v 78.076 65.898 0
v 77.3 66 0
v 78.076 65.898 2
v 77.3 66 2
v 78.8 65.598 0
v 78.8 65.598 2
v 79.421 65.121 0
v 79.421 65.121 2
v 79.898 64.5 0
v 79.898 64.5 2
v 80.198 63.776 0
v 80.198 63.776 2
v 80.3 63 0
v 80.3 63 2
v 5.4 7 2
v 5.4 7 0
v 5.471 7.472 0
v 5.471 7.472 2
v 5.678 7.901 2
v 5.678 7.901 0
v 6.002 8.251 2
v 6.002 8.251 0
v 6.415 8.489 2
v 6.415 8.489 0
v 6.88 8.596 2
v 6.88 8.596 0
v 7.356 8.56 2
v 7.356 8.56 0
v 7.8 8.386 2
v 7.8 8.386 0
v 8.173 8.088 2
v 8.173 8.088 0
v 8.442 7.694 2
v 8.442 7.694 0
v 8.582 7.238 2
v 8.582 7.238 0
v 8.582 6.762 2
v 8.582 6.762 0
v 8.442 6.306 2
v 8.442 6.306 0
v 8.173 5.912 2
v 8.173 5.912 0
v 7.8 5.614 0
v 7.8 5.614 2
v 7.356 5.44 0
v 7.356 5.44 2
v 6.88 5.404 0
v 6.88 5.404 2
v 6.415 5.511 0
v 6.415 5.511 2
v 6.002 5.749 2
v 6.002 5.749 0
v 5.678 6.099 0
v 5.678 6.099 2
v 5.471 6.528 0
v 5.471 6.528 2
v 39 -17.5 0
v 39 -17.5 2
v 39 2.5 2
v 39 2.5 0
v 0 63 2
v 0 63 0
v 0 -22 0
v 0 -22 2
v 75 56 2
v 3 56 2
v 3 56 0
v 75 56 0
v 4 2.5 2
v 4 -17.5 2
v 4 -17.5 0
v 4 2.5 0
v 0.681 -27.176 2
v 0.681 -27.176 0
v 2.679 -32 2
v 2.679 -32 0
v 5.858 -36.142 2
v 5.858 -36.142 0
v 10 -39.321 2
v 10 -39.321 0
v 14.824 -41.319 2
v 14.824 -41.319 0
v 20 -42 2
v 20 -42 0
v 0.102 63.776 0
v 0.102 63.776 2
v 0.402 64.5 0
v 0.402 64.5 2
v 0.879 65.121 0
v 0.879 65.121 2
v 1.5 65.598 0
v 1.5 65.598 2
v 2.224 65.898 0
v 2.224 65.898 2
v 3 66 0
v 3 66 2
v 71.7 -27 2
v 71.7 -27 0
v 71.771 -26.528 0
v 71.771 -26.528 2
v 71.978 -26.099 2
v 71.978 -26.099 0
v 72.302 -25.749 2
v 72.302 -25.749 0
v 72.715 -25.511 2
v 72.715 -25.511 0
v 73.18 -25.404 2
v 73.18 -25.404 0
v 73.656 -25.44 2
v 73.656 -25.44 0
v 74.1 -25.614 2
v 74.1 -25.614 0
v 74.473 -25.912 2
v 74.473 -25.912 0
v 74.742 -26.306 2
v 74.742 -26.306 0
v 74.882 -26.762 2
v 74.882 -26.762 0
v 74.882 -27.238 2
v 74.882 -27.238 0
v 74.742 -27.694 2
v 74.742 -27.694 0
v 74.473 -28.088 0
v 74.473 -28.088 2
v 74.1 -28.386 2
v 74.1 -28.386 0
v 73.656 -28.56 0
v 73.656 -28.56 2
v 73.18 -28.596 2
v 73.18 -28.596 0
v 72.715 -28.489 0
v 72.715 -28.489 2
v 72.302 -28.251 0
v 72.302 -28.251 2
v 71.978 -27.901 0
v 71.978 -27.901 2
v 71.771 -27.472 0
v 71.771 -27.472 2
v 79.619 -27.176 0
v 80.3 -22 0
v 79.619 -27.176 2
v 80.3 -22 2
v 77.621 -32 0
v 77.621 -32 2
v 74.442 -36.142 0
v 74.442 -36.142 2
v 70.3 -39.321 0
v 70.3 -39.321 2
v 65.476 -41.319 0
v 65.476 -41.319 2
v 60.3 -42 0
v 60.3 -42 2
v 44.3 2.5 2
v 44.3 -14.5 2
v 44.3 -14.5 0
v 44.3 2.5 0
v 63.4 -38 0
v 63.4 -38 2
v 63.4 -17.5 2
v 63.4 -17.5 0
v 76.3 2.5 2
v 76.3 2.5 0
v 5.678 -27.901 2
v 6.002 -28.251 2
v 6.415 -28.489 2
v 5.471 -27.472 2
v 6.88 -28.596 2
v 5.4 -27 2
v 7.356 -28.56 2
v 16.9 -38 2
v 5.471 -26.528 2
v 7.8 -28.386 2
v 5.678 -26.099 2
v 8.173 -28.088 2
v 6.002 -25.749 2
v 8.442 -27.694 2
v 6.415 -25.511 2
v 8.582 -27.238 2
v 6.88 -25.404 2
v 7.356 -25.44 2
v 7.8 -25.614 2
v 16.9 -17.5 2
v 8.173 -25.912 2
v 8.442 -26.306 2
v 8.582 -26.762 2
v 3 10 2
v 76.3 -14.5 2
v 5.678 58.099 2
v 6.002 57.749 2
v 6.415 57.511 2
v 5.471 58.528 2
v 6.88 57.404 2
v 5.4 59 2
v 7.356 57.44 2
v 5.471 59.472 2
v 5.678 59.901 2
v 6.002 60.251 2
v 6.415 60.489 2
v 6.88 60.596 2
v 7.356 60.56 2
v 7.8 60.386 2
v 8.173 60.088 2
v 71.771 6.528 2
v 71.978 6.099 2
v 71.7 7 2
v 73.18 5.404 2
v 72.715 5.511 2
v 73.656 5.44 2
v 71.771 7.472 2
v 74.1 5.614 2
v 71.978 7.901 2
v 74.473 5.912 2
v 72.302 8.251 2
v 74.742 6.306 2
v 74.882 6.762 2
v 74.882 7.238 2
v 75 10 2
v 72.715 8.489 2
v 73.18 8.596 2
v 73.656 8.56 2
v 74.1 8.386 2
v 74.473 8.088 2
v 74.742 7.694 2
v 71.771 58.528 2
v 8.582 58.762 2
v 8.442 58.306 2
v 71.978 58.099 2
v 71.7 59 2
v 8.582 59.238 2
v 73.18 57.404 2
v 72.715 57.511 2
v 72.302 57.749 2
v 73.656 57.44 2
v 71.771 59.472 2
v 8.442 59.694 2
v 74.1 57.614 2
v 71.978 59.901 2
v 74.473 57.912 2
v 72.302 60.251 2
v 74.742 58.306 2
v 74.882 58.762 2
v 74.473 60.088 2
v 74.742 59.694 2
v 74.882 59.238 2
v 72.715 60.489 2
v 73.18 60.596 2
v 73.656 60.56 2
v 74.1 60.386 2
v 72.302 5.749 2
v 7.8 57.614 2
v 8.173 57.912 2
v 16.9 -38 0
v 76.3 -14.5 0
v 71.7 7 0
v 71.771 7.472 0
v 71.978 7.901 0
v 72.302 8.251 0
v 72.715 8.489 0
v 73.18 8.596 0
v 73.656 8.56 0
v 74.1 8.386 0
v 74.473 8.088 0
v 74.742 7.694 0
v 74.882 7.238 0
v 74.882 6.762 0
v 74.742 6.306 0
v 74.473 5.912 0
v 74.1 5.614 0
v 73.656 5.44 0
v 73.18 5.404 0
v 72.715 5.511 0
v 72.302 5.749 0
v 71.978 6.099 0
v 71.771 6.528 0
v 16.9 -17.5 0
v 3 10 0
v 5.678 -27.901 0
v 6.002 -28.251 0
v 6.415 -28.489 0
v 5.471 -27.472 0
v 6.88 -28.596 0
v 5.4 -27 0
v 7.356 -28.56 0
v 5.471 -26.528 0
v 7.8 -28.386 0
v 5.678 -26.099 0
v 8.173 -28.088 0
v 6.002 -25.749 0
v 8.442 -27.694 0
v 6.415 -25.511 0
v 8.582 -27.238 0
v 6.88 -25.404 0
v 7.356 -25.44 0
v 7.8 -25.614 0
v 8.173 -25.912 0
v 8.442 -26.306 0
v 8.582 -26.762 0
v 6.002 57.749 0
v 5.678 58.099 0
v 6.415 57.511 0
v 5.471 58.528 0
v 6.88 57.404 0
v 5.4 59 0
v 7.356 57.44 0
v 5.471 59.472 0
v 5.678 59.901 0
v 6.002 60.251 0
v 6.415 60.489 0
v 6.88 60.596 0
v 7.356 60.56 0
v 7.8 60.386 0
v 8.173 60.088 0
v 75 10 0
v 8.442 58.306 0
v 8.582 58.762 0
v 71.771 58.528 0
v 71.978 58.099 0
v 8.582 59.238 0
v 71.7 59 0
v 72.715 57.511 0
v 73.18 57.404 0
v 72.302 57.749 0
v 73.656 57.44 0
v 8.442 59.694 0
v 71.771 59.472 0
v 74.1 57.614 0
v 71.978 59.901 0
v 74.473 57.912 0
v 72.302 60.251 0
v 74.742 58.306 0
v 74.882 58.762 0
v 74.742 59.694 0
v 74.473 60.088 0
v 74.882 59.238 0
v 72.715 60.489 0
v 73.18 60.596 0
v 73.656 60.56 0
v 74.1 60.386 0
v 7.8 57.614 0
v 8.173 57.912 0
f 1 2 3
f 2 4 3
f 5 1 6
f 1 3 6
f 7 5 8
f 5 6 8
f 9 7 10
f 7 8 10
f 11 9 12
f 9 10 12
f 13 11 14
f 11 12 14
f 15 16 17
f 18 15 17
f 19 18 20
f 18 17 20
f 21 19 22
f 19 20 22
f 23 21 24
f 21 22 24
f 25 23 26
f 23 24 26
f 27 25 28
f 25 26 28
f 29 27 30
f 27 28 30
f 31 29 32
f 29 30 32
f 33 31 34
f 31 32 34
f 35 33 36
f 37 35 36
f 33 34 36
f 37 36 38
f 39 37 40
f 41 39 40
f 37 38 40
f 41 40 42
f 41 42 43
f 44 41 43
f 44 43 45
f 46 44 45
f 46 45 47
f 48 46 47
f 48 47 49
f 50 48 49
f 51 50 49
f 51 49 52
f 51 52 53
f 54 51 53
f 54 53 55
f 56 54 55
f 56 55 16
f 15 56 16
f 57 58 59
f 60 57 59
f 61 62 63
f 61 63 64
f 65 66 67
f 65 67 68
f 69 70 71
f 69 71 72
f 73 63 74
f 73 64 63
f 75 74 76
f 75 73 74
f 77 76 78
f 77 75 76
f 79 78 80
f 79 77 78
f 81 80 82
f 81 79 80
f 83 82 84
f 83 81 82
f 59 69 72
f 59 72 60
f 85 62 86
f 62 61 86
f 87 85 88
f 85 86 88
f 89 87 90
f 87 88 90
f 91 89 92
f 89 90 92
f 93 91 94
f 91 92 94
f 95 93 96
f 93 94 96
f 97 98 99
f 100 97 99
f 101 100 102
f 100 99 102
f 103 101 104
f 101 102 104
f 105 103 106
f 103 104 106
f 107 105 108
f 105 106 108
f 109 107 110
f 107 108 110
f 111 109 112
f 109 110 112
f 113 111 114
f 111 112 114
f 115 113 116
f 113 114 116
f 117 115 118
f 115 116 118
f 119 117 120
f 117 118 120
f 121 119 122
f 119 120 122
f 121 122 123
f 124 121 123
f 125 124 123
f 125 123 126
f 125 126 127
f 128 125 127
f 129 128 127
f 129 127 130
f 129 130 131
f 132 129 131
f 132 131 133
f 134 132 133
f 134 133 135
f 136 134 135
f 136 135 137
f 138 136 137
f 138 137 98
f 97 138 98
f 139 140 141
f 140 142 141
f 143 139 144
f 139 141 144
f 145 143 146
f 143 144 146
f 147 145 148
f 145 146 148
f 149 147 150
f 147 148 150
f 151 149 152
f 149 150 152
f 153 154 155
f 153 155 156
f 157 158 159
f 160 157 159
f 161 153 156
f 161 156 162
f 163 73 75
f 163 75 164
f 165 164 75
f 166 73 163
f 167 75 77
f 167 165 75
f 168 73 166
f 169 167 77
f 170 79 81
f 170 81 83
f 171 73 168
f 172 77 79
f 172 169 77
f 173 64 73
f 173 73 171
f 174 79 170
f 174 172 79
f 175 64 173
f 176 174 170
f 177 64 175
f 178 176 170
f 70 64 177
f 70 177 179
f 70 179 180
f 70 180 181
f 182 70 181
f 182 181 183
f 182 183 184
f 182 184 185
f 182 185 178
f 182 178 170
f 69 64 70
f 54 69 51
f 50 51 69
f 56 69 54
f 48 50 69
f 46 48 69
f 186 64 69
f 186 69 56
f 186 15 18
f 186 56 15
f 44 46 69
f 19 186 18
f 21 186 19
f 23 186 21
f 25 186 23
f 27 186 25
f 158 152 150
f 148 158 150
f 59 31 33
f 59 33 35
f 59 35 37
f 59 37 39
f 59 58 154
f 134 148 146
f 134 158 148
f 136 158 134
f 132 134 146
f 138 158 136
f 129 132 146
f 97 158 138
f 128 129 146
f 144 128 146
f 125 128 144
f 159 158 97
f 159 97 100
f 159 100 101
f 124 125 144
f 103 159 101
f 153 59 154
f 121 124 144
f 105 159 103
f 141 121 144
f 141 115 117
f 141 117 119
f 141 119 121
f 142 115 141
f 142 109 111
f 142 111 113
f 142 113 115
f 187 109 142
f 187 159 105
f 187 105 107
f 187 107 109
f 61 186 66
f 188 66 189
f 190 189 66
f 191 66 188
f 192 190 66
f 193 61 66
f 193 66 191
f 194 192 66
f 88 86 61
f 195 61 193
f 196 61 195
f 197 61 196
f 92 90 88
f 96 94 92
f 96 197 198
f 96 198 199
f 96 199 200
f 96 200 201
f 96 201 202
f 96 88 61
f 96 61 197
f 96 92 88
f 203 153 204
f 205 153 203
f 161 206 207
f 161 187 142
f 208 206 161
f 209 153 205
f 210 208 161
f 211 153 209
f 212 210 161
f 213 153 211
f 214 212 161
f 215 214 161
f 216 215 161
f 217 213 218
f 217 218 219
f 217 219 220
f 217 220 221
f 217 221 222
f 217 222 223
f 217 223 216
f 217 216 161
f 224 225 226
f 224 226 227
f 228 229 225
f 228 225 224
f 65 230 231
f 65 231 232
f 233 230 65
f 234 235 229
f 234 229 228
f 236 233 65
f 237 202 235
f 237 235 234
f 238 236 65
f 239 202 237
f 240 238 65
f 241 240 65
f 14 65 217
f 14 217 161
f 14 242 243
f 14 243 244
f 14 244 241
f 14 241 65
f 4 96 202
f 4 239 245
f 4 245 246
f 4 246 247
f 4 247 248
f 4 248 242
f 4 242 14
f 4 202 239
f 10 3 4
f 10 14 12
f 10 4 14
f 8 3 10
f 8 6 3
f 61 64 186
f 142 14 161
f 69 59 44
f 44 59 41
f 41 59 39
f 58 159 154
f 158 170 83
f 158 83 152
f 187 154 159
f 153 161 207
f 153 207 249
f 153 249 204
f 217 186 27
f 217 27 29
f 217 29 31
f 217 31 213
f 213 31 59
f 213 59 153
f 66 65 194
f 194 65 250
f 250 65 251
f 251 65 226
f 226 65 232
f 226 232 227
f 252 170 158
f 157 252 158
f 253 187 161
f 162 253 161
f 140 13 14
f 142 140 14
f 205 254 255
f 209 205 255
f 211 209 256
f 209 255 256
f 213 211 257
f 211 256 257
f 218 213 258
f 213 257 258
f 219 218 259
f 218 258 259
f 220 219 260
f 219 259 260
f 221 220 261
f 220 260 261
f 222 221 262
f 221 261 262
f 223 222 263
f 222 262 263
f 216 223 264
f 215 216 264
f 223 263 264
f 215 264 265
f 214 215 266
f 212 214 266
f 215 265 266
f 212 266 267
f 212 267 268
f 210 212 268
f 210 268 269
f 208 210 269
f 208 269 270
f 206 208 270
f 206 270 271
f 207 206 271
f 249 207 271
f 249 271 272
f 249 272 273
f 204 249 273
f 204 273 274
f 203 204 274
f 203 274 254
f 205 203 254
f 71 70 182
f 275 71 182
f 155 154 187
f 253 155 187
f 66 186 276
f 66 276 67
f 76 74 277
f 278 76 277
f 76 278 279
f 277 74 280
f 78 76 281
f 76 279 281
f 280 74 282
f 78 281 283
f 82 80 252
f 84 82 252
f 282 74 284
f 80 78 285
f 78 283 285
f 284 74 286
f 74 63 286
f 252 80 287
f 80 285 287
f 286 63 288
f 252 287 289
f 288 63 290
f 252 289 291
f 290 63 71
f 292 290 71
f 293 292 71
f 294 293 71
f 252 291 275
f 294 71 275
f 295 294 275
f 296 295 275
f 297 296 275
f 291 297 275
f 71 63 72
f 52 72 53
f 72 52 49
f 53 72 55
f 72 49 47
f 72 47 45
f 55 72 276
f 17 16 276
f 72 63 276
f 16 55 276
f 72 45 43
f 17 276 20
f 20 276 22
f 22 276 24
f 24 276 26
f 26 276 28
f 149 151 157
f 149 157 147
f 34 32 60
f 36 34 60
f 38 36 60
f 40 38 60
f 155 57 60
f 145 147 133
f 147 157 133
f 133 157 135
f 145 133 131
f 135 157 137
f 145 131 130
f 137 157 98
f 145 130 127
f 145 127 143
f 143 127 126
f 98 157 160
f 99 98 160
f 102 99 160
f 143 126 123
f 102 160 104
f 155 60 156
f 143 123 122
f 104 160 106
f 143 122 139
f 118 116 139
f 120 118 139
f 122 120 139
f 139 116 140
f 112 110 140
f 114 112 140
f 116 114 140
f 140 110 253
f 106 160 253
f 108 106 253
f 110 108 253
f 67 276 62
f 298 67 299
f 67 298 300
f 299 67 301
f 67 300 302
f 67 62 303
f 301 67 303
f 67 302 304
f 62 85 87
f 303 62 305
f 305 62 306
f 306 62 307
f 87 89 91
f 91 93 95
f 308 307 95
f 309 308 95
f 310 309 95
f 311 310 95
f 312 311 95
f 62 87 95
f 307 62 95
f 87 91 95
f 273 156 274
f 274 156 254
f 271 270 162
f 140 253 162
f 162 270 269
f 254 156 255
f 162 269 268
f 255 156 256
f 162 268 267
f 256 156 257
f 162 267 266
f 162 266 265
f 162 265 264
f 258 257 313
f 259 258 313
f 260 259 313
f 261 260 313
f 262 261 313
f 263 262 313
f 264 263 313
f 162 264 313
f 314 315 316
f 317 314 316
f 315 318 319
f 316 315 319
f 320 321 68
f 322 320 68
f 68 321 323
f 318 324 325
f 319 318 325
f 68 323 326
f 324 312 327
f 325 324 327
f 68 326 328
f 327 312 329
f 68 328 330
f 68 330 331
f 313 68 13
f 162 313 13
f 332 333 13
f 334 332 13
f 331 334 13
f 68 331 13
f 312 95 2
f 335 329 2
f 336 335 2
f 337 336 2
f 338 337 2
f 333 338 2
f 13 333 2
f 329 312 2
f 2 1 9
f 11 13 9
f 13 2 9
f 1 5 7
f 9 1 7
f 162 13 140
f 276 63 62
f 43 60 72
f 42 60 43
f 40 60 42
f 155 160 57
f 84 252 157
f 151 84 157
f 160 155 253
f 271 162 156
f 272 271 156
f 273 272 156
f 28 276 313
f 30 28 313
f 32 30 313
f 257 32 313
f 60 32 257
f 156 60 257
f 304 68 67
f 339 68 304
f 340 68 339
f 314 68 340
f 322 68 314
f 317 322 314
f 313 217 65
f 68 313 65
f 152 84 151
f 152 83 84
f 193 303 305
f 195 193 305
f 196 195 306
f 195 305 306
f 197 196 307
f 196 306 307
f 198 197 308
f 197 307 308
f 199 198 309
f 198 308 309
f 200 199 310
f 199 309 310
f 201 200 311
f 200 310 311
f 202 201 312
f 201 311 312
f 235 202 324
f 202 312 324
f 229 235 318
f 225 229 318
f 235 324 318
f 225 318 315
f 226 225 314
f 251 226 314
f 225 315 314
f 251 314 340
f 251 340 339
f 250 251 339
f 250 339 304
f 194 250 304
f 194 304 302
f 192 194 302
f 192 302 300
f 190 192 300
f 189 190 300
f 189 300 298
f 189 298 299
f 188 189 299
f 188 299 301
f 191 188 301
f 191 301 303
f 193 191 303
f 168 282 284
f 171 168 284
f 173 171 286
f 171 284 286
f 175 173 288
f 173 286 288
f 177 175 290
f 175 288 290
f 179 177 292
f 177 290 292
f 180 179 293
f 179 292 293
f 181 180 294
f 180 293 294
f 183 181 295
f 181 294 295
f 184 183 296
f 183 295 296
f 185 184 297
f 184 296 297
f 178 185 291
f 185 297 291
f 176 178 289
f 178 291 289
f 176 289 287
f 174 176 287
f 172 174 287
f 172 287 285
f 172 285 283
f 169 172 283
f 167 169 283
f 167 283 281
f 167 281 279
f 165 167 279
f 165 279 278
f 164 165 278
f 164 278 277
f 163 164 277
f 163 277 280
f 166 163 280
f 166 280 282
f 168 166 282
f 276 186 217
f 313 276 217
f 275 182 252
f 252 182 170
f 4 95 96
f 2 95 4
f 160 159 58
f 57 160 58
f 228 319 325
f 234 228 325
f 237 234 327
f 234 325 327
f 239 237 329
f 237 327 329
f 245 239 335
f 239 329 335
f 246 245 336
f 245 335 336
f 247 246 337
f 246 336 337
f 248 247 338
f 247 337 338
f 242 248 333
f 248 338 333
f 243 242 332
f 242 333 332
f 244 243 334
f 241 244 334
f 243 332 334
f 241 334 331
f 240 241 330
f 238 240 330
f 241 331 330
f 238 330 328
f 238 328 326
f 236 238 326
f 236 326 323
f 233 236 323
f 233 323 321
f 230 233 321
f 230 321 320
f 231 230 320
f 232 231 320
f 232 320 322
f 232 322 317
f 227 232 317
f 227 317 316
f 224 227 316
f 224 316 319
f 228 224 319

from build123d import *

# Parameters (mm, degrees)
SKETCH1_W                      = 80.3
SKETCH1_H                      = 66
BOSS_EXTRUDE1_DEPTH            = 2
F_3_2_3_2_DIAMETER_HOLE1_D     = 3.2
FILLET1_R                      = 3
SKETCH4_W                      = 80.3
SKETCH4_H                      = 2
BOSS_EXTRUDE2_DEPTH            = 42
FILLET2_R                      = 20
F_3_2_3_2_DIAMETER_HOLE2_D     = 3.2
F_3_2_3_2_DIAMETER_HOLE2_DEPTH = 60
F_3_2_3_2_DIAMETER_HOLE2_TIP   = 0.96137699
SKETCH7_W                      = 72
SKETCH7_H                      = 46
CUT_EXTRUDE1_DEPTH             = 3
SKETCH10_W                     = 35
SKETCH10_H                     = 20
SKETCH10_W_2                   = 32
SKETCH10_H_2                   = 17
CUT_EXTRUDE3_DEPTH             = 3


with BuildPart() as part:
    # Sketch1 → Boss-Extrude1 (new body)
    with BuildSketch(Plane.XY):
        with Locations((40.15, 33)):
            Rectangle(SKETCH1_W, SKETCH1_H)
    extrude(amount=BOSS_EXTRUDE1_DEPTH)

    # Ø3.2 (3.2) Diameter Hole1 (through all)
    with Locations(Plane.XY.offset(2)):
        with Locations((7, 59), (73.3, 59), (73.3, 7), (7, 7)):
            Hole(F_3_2_3_2_DIAMETER_HOLE1_D / 2)

    # Fillet1
    fillet1_edges = [part.edges().sort_by_distance(p)[0] for p in [
        (0, 66, 1),
        (80.3, 66, 1),
    ]]
    fillet(fillet1_edges, radius=FILLET1_R)

    # Sketch4 → Boss-Extrude2 (add)
    with BuildSketch(Plane.XZ):
        with Locations((40.15, 1)):
            Rectangle(SKETCH4_W, SKETCH4_H)
    extrude(amount=BOSS_EXTRUDE2_DEPTH)

    # Fillet2
    fillet2_edges = [part.edges().sort_by_distance(p)[0] for p in [
        (0, -42, 1),
        (80.3, -42, 1),
    ]]
    fillet(fillet2_edges, radius=FILLET2_R)

    # Ø3.2 (3.2) Diameter Hole2
    with Locations(Plane.XY.offset(2)):
        with Locations((7, -27), (73.3, -27)):
            Hole(F_3_2_3_2_DIAMETER_HOLE2_D / 2, depth=F_3_2_3_2_DIAMETER_HOLE2_DEPTH)
            with Locations((0, 0, -(F_3_2_3_2_DIAMETER_HOLE2_DEPTH + F_3_2_3_2_DIAMETER_HOLE2_TIP / 2))):  # 118° drill point
                Cone(0, F_3_2_3_2_DIAMETER_HOLE2_D / 2, F_3_2_3_2_DIAMETER_HOLE2_TIP, mode=Mode.SUBTRACT)

    # Sketch7 → Cut-Extrude1 (cut, through all)
    with BuildSketch(Plane.XY.offset(2)):
        with Locations((39, 33)):
            Rectangle(SKETCH7_W, SKETCH7_H)
    extrude(amount=-CUT_EXTRUDE1_DEPTH, mode=Mode.SUBTRACT)

    # Sketch10 → Cut-Extrude3 (cut, through all)
    with BuildSketch(Plane.XY.offset(2)):
        with Locations((21.5, -7.5)):
            Rectangle(SKETCH10_W, SKETCH10_H)
        Polygon((63.4, -17.5), (39, -17.5), (16.9, -17.5), (16.9, -38), (63.4, -38), align=None)
        with Locations((60.3, -6)):
            Rectangle(SKETCH10_W_2, SKETCH10_H_2)
    extrude(amount=-CUT_EXTRUDE3_DEPTH, mode=Mode.SUBTRACT)


solid = part.part
